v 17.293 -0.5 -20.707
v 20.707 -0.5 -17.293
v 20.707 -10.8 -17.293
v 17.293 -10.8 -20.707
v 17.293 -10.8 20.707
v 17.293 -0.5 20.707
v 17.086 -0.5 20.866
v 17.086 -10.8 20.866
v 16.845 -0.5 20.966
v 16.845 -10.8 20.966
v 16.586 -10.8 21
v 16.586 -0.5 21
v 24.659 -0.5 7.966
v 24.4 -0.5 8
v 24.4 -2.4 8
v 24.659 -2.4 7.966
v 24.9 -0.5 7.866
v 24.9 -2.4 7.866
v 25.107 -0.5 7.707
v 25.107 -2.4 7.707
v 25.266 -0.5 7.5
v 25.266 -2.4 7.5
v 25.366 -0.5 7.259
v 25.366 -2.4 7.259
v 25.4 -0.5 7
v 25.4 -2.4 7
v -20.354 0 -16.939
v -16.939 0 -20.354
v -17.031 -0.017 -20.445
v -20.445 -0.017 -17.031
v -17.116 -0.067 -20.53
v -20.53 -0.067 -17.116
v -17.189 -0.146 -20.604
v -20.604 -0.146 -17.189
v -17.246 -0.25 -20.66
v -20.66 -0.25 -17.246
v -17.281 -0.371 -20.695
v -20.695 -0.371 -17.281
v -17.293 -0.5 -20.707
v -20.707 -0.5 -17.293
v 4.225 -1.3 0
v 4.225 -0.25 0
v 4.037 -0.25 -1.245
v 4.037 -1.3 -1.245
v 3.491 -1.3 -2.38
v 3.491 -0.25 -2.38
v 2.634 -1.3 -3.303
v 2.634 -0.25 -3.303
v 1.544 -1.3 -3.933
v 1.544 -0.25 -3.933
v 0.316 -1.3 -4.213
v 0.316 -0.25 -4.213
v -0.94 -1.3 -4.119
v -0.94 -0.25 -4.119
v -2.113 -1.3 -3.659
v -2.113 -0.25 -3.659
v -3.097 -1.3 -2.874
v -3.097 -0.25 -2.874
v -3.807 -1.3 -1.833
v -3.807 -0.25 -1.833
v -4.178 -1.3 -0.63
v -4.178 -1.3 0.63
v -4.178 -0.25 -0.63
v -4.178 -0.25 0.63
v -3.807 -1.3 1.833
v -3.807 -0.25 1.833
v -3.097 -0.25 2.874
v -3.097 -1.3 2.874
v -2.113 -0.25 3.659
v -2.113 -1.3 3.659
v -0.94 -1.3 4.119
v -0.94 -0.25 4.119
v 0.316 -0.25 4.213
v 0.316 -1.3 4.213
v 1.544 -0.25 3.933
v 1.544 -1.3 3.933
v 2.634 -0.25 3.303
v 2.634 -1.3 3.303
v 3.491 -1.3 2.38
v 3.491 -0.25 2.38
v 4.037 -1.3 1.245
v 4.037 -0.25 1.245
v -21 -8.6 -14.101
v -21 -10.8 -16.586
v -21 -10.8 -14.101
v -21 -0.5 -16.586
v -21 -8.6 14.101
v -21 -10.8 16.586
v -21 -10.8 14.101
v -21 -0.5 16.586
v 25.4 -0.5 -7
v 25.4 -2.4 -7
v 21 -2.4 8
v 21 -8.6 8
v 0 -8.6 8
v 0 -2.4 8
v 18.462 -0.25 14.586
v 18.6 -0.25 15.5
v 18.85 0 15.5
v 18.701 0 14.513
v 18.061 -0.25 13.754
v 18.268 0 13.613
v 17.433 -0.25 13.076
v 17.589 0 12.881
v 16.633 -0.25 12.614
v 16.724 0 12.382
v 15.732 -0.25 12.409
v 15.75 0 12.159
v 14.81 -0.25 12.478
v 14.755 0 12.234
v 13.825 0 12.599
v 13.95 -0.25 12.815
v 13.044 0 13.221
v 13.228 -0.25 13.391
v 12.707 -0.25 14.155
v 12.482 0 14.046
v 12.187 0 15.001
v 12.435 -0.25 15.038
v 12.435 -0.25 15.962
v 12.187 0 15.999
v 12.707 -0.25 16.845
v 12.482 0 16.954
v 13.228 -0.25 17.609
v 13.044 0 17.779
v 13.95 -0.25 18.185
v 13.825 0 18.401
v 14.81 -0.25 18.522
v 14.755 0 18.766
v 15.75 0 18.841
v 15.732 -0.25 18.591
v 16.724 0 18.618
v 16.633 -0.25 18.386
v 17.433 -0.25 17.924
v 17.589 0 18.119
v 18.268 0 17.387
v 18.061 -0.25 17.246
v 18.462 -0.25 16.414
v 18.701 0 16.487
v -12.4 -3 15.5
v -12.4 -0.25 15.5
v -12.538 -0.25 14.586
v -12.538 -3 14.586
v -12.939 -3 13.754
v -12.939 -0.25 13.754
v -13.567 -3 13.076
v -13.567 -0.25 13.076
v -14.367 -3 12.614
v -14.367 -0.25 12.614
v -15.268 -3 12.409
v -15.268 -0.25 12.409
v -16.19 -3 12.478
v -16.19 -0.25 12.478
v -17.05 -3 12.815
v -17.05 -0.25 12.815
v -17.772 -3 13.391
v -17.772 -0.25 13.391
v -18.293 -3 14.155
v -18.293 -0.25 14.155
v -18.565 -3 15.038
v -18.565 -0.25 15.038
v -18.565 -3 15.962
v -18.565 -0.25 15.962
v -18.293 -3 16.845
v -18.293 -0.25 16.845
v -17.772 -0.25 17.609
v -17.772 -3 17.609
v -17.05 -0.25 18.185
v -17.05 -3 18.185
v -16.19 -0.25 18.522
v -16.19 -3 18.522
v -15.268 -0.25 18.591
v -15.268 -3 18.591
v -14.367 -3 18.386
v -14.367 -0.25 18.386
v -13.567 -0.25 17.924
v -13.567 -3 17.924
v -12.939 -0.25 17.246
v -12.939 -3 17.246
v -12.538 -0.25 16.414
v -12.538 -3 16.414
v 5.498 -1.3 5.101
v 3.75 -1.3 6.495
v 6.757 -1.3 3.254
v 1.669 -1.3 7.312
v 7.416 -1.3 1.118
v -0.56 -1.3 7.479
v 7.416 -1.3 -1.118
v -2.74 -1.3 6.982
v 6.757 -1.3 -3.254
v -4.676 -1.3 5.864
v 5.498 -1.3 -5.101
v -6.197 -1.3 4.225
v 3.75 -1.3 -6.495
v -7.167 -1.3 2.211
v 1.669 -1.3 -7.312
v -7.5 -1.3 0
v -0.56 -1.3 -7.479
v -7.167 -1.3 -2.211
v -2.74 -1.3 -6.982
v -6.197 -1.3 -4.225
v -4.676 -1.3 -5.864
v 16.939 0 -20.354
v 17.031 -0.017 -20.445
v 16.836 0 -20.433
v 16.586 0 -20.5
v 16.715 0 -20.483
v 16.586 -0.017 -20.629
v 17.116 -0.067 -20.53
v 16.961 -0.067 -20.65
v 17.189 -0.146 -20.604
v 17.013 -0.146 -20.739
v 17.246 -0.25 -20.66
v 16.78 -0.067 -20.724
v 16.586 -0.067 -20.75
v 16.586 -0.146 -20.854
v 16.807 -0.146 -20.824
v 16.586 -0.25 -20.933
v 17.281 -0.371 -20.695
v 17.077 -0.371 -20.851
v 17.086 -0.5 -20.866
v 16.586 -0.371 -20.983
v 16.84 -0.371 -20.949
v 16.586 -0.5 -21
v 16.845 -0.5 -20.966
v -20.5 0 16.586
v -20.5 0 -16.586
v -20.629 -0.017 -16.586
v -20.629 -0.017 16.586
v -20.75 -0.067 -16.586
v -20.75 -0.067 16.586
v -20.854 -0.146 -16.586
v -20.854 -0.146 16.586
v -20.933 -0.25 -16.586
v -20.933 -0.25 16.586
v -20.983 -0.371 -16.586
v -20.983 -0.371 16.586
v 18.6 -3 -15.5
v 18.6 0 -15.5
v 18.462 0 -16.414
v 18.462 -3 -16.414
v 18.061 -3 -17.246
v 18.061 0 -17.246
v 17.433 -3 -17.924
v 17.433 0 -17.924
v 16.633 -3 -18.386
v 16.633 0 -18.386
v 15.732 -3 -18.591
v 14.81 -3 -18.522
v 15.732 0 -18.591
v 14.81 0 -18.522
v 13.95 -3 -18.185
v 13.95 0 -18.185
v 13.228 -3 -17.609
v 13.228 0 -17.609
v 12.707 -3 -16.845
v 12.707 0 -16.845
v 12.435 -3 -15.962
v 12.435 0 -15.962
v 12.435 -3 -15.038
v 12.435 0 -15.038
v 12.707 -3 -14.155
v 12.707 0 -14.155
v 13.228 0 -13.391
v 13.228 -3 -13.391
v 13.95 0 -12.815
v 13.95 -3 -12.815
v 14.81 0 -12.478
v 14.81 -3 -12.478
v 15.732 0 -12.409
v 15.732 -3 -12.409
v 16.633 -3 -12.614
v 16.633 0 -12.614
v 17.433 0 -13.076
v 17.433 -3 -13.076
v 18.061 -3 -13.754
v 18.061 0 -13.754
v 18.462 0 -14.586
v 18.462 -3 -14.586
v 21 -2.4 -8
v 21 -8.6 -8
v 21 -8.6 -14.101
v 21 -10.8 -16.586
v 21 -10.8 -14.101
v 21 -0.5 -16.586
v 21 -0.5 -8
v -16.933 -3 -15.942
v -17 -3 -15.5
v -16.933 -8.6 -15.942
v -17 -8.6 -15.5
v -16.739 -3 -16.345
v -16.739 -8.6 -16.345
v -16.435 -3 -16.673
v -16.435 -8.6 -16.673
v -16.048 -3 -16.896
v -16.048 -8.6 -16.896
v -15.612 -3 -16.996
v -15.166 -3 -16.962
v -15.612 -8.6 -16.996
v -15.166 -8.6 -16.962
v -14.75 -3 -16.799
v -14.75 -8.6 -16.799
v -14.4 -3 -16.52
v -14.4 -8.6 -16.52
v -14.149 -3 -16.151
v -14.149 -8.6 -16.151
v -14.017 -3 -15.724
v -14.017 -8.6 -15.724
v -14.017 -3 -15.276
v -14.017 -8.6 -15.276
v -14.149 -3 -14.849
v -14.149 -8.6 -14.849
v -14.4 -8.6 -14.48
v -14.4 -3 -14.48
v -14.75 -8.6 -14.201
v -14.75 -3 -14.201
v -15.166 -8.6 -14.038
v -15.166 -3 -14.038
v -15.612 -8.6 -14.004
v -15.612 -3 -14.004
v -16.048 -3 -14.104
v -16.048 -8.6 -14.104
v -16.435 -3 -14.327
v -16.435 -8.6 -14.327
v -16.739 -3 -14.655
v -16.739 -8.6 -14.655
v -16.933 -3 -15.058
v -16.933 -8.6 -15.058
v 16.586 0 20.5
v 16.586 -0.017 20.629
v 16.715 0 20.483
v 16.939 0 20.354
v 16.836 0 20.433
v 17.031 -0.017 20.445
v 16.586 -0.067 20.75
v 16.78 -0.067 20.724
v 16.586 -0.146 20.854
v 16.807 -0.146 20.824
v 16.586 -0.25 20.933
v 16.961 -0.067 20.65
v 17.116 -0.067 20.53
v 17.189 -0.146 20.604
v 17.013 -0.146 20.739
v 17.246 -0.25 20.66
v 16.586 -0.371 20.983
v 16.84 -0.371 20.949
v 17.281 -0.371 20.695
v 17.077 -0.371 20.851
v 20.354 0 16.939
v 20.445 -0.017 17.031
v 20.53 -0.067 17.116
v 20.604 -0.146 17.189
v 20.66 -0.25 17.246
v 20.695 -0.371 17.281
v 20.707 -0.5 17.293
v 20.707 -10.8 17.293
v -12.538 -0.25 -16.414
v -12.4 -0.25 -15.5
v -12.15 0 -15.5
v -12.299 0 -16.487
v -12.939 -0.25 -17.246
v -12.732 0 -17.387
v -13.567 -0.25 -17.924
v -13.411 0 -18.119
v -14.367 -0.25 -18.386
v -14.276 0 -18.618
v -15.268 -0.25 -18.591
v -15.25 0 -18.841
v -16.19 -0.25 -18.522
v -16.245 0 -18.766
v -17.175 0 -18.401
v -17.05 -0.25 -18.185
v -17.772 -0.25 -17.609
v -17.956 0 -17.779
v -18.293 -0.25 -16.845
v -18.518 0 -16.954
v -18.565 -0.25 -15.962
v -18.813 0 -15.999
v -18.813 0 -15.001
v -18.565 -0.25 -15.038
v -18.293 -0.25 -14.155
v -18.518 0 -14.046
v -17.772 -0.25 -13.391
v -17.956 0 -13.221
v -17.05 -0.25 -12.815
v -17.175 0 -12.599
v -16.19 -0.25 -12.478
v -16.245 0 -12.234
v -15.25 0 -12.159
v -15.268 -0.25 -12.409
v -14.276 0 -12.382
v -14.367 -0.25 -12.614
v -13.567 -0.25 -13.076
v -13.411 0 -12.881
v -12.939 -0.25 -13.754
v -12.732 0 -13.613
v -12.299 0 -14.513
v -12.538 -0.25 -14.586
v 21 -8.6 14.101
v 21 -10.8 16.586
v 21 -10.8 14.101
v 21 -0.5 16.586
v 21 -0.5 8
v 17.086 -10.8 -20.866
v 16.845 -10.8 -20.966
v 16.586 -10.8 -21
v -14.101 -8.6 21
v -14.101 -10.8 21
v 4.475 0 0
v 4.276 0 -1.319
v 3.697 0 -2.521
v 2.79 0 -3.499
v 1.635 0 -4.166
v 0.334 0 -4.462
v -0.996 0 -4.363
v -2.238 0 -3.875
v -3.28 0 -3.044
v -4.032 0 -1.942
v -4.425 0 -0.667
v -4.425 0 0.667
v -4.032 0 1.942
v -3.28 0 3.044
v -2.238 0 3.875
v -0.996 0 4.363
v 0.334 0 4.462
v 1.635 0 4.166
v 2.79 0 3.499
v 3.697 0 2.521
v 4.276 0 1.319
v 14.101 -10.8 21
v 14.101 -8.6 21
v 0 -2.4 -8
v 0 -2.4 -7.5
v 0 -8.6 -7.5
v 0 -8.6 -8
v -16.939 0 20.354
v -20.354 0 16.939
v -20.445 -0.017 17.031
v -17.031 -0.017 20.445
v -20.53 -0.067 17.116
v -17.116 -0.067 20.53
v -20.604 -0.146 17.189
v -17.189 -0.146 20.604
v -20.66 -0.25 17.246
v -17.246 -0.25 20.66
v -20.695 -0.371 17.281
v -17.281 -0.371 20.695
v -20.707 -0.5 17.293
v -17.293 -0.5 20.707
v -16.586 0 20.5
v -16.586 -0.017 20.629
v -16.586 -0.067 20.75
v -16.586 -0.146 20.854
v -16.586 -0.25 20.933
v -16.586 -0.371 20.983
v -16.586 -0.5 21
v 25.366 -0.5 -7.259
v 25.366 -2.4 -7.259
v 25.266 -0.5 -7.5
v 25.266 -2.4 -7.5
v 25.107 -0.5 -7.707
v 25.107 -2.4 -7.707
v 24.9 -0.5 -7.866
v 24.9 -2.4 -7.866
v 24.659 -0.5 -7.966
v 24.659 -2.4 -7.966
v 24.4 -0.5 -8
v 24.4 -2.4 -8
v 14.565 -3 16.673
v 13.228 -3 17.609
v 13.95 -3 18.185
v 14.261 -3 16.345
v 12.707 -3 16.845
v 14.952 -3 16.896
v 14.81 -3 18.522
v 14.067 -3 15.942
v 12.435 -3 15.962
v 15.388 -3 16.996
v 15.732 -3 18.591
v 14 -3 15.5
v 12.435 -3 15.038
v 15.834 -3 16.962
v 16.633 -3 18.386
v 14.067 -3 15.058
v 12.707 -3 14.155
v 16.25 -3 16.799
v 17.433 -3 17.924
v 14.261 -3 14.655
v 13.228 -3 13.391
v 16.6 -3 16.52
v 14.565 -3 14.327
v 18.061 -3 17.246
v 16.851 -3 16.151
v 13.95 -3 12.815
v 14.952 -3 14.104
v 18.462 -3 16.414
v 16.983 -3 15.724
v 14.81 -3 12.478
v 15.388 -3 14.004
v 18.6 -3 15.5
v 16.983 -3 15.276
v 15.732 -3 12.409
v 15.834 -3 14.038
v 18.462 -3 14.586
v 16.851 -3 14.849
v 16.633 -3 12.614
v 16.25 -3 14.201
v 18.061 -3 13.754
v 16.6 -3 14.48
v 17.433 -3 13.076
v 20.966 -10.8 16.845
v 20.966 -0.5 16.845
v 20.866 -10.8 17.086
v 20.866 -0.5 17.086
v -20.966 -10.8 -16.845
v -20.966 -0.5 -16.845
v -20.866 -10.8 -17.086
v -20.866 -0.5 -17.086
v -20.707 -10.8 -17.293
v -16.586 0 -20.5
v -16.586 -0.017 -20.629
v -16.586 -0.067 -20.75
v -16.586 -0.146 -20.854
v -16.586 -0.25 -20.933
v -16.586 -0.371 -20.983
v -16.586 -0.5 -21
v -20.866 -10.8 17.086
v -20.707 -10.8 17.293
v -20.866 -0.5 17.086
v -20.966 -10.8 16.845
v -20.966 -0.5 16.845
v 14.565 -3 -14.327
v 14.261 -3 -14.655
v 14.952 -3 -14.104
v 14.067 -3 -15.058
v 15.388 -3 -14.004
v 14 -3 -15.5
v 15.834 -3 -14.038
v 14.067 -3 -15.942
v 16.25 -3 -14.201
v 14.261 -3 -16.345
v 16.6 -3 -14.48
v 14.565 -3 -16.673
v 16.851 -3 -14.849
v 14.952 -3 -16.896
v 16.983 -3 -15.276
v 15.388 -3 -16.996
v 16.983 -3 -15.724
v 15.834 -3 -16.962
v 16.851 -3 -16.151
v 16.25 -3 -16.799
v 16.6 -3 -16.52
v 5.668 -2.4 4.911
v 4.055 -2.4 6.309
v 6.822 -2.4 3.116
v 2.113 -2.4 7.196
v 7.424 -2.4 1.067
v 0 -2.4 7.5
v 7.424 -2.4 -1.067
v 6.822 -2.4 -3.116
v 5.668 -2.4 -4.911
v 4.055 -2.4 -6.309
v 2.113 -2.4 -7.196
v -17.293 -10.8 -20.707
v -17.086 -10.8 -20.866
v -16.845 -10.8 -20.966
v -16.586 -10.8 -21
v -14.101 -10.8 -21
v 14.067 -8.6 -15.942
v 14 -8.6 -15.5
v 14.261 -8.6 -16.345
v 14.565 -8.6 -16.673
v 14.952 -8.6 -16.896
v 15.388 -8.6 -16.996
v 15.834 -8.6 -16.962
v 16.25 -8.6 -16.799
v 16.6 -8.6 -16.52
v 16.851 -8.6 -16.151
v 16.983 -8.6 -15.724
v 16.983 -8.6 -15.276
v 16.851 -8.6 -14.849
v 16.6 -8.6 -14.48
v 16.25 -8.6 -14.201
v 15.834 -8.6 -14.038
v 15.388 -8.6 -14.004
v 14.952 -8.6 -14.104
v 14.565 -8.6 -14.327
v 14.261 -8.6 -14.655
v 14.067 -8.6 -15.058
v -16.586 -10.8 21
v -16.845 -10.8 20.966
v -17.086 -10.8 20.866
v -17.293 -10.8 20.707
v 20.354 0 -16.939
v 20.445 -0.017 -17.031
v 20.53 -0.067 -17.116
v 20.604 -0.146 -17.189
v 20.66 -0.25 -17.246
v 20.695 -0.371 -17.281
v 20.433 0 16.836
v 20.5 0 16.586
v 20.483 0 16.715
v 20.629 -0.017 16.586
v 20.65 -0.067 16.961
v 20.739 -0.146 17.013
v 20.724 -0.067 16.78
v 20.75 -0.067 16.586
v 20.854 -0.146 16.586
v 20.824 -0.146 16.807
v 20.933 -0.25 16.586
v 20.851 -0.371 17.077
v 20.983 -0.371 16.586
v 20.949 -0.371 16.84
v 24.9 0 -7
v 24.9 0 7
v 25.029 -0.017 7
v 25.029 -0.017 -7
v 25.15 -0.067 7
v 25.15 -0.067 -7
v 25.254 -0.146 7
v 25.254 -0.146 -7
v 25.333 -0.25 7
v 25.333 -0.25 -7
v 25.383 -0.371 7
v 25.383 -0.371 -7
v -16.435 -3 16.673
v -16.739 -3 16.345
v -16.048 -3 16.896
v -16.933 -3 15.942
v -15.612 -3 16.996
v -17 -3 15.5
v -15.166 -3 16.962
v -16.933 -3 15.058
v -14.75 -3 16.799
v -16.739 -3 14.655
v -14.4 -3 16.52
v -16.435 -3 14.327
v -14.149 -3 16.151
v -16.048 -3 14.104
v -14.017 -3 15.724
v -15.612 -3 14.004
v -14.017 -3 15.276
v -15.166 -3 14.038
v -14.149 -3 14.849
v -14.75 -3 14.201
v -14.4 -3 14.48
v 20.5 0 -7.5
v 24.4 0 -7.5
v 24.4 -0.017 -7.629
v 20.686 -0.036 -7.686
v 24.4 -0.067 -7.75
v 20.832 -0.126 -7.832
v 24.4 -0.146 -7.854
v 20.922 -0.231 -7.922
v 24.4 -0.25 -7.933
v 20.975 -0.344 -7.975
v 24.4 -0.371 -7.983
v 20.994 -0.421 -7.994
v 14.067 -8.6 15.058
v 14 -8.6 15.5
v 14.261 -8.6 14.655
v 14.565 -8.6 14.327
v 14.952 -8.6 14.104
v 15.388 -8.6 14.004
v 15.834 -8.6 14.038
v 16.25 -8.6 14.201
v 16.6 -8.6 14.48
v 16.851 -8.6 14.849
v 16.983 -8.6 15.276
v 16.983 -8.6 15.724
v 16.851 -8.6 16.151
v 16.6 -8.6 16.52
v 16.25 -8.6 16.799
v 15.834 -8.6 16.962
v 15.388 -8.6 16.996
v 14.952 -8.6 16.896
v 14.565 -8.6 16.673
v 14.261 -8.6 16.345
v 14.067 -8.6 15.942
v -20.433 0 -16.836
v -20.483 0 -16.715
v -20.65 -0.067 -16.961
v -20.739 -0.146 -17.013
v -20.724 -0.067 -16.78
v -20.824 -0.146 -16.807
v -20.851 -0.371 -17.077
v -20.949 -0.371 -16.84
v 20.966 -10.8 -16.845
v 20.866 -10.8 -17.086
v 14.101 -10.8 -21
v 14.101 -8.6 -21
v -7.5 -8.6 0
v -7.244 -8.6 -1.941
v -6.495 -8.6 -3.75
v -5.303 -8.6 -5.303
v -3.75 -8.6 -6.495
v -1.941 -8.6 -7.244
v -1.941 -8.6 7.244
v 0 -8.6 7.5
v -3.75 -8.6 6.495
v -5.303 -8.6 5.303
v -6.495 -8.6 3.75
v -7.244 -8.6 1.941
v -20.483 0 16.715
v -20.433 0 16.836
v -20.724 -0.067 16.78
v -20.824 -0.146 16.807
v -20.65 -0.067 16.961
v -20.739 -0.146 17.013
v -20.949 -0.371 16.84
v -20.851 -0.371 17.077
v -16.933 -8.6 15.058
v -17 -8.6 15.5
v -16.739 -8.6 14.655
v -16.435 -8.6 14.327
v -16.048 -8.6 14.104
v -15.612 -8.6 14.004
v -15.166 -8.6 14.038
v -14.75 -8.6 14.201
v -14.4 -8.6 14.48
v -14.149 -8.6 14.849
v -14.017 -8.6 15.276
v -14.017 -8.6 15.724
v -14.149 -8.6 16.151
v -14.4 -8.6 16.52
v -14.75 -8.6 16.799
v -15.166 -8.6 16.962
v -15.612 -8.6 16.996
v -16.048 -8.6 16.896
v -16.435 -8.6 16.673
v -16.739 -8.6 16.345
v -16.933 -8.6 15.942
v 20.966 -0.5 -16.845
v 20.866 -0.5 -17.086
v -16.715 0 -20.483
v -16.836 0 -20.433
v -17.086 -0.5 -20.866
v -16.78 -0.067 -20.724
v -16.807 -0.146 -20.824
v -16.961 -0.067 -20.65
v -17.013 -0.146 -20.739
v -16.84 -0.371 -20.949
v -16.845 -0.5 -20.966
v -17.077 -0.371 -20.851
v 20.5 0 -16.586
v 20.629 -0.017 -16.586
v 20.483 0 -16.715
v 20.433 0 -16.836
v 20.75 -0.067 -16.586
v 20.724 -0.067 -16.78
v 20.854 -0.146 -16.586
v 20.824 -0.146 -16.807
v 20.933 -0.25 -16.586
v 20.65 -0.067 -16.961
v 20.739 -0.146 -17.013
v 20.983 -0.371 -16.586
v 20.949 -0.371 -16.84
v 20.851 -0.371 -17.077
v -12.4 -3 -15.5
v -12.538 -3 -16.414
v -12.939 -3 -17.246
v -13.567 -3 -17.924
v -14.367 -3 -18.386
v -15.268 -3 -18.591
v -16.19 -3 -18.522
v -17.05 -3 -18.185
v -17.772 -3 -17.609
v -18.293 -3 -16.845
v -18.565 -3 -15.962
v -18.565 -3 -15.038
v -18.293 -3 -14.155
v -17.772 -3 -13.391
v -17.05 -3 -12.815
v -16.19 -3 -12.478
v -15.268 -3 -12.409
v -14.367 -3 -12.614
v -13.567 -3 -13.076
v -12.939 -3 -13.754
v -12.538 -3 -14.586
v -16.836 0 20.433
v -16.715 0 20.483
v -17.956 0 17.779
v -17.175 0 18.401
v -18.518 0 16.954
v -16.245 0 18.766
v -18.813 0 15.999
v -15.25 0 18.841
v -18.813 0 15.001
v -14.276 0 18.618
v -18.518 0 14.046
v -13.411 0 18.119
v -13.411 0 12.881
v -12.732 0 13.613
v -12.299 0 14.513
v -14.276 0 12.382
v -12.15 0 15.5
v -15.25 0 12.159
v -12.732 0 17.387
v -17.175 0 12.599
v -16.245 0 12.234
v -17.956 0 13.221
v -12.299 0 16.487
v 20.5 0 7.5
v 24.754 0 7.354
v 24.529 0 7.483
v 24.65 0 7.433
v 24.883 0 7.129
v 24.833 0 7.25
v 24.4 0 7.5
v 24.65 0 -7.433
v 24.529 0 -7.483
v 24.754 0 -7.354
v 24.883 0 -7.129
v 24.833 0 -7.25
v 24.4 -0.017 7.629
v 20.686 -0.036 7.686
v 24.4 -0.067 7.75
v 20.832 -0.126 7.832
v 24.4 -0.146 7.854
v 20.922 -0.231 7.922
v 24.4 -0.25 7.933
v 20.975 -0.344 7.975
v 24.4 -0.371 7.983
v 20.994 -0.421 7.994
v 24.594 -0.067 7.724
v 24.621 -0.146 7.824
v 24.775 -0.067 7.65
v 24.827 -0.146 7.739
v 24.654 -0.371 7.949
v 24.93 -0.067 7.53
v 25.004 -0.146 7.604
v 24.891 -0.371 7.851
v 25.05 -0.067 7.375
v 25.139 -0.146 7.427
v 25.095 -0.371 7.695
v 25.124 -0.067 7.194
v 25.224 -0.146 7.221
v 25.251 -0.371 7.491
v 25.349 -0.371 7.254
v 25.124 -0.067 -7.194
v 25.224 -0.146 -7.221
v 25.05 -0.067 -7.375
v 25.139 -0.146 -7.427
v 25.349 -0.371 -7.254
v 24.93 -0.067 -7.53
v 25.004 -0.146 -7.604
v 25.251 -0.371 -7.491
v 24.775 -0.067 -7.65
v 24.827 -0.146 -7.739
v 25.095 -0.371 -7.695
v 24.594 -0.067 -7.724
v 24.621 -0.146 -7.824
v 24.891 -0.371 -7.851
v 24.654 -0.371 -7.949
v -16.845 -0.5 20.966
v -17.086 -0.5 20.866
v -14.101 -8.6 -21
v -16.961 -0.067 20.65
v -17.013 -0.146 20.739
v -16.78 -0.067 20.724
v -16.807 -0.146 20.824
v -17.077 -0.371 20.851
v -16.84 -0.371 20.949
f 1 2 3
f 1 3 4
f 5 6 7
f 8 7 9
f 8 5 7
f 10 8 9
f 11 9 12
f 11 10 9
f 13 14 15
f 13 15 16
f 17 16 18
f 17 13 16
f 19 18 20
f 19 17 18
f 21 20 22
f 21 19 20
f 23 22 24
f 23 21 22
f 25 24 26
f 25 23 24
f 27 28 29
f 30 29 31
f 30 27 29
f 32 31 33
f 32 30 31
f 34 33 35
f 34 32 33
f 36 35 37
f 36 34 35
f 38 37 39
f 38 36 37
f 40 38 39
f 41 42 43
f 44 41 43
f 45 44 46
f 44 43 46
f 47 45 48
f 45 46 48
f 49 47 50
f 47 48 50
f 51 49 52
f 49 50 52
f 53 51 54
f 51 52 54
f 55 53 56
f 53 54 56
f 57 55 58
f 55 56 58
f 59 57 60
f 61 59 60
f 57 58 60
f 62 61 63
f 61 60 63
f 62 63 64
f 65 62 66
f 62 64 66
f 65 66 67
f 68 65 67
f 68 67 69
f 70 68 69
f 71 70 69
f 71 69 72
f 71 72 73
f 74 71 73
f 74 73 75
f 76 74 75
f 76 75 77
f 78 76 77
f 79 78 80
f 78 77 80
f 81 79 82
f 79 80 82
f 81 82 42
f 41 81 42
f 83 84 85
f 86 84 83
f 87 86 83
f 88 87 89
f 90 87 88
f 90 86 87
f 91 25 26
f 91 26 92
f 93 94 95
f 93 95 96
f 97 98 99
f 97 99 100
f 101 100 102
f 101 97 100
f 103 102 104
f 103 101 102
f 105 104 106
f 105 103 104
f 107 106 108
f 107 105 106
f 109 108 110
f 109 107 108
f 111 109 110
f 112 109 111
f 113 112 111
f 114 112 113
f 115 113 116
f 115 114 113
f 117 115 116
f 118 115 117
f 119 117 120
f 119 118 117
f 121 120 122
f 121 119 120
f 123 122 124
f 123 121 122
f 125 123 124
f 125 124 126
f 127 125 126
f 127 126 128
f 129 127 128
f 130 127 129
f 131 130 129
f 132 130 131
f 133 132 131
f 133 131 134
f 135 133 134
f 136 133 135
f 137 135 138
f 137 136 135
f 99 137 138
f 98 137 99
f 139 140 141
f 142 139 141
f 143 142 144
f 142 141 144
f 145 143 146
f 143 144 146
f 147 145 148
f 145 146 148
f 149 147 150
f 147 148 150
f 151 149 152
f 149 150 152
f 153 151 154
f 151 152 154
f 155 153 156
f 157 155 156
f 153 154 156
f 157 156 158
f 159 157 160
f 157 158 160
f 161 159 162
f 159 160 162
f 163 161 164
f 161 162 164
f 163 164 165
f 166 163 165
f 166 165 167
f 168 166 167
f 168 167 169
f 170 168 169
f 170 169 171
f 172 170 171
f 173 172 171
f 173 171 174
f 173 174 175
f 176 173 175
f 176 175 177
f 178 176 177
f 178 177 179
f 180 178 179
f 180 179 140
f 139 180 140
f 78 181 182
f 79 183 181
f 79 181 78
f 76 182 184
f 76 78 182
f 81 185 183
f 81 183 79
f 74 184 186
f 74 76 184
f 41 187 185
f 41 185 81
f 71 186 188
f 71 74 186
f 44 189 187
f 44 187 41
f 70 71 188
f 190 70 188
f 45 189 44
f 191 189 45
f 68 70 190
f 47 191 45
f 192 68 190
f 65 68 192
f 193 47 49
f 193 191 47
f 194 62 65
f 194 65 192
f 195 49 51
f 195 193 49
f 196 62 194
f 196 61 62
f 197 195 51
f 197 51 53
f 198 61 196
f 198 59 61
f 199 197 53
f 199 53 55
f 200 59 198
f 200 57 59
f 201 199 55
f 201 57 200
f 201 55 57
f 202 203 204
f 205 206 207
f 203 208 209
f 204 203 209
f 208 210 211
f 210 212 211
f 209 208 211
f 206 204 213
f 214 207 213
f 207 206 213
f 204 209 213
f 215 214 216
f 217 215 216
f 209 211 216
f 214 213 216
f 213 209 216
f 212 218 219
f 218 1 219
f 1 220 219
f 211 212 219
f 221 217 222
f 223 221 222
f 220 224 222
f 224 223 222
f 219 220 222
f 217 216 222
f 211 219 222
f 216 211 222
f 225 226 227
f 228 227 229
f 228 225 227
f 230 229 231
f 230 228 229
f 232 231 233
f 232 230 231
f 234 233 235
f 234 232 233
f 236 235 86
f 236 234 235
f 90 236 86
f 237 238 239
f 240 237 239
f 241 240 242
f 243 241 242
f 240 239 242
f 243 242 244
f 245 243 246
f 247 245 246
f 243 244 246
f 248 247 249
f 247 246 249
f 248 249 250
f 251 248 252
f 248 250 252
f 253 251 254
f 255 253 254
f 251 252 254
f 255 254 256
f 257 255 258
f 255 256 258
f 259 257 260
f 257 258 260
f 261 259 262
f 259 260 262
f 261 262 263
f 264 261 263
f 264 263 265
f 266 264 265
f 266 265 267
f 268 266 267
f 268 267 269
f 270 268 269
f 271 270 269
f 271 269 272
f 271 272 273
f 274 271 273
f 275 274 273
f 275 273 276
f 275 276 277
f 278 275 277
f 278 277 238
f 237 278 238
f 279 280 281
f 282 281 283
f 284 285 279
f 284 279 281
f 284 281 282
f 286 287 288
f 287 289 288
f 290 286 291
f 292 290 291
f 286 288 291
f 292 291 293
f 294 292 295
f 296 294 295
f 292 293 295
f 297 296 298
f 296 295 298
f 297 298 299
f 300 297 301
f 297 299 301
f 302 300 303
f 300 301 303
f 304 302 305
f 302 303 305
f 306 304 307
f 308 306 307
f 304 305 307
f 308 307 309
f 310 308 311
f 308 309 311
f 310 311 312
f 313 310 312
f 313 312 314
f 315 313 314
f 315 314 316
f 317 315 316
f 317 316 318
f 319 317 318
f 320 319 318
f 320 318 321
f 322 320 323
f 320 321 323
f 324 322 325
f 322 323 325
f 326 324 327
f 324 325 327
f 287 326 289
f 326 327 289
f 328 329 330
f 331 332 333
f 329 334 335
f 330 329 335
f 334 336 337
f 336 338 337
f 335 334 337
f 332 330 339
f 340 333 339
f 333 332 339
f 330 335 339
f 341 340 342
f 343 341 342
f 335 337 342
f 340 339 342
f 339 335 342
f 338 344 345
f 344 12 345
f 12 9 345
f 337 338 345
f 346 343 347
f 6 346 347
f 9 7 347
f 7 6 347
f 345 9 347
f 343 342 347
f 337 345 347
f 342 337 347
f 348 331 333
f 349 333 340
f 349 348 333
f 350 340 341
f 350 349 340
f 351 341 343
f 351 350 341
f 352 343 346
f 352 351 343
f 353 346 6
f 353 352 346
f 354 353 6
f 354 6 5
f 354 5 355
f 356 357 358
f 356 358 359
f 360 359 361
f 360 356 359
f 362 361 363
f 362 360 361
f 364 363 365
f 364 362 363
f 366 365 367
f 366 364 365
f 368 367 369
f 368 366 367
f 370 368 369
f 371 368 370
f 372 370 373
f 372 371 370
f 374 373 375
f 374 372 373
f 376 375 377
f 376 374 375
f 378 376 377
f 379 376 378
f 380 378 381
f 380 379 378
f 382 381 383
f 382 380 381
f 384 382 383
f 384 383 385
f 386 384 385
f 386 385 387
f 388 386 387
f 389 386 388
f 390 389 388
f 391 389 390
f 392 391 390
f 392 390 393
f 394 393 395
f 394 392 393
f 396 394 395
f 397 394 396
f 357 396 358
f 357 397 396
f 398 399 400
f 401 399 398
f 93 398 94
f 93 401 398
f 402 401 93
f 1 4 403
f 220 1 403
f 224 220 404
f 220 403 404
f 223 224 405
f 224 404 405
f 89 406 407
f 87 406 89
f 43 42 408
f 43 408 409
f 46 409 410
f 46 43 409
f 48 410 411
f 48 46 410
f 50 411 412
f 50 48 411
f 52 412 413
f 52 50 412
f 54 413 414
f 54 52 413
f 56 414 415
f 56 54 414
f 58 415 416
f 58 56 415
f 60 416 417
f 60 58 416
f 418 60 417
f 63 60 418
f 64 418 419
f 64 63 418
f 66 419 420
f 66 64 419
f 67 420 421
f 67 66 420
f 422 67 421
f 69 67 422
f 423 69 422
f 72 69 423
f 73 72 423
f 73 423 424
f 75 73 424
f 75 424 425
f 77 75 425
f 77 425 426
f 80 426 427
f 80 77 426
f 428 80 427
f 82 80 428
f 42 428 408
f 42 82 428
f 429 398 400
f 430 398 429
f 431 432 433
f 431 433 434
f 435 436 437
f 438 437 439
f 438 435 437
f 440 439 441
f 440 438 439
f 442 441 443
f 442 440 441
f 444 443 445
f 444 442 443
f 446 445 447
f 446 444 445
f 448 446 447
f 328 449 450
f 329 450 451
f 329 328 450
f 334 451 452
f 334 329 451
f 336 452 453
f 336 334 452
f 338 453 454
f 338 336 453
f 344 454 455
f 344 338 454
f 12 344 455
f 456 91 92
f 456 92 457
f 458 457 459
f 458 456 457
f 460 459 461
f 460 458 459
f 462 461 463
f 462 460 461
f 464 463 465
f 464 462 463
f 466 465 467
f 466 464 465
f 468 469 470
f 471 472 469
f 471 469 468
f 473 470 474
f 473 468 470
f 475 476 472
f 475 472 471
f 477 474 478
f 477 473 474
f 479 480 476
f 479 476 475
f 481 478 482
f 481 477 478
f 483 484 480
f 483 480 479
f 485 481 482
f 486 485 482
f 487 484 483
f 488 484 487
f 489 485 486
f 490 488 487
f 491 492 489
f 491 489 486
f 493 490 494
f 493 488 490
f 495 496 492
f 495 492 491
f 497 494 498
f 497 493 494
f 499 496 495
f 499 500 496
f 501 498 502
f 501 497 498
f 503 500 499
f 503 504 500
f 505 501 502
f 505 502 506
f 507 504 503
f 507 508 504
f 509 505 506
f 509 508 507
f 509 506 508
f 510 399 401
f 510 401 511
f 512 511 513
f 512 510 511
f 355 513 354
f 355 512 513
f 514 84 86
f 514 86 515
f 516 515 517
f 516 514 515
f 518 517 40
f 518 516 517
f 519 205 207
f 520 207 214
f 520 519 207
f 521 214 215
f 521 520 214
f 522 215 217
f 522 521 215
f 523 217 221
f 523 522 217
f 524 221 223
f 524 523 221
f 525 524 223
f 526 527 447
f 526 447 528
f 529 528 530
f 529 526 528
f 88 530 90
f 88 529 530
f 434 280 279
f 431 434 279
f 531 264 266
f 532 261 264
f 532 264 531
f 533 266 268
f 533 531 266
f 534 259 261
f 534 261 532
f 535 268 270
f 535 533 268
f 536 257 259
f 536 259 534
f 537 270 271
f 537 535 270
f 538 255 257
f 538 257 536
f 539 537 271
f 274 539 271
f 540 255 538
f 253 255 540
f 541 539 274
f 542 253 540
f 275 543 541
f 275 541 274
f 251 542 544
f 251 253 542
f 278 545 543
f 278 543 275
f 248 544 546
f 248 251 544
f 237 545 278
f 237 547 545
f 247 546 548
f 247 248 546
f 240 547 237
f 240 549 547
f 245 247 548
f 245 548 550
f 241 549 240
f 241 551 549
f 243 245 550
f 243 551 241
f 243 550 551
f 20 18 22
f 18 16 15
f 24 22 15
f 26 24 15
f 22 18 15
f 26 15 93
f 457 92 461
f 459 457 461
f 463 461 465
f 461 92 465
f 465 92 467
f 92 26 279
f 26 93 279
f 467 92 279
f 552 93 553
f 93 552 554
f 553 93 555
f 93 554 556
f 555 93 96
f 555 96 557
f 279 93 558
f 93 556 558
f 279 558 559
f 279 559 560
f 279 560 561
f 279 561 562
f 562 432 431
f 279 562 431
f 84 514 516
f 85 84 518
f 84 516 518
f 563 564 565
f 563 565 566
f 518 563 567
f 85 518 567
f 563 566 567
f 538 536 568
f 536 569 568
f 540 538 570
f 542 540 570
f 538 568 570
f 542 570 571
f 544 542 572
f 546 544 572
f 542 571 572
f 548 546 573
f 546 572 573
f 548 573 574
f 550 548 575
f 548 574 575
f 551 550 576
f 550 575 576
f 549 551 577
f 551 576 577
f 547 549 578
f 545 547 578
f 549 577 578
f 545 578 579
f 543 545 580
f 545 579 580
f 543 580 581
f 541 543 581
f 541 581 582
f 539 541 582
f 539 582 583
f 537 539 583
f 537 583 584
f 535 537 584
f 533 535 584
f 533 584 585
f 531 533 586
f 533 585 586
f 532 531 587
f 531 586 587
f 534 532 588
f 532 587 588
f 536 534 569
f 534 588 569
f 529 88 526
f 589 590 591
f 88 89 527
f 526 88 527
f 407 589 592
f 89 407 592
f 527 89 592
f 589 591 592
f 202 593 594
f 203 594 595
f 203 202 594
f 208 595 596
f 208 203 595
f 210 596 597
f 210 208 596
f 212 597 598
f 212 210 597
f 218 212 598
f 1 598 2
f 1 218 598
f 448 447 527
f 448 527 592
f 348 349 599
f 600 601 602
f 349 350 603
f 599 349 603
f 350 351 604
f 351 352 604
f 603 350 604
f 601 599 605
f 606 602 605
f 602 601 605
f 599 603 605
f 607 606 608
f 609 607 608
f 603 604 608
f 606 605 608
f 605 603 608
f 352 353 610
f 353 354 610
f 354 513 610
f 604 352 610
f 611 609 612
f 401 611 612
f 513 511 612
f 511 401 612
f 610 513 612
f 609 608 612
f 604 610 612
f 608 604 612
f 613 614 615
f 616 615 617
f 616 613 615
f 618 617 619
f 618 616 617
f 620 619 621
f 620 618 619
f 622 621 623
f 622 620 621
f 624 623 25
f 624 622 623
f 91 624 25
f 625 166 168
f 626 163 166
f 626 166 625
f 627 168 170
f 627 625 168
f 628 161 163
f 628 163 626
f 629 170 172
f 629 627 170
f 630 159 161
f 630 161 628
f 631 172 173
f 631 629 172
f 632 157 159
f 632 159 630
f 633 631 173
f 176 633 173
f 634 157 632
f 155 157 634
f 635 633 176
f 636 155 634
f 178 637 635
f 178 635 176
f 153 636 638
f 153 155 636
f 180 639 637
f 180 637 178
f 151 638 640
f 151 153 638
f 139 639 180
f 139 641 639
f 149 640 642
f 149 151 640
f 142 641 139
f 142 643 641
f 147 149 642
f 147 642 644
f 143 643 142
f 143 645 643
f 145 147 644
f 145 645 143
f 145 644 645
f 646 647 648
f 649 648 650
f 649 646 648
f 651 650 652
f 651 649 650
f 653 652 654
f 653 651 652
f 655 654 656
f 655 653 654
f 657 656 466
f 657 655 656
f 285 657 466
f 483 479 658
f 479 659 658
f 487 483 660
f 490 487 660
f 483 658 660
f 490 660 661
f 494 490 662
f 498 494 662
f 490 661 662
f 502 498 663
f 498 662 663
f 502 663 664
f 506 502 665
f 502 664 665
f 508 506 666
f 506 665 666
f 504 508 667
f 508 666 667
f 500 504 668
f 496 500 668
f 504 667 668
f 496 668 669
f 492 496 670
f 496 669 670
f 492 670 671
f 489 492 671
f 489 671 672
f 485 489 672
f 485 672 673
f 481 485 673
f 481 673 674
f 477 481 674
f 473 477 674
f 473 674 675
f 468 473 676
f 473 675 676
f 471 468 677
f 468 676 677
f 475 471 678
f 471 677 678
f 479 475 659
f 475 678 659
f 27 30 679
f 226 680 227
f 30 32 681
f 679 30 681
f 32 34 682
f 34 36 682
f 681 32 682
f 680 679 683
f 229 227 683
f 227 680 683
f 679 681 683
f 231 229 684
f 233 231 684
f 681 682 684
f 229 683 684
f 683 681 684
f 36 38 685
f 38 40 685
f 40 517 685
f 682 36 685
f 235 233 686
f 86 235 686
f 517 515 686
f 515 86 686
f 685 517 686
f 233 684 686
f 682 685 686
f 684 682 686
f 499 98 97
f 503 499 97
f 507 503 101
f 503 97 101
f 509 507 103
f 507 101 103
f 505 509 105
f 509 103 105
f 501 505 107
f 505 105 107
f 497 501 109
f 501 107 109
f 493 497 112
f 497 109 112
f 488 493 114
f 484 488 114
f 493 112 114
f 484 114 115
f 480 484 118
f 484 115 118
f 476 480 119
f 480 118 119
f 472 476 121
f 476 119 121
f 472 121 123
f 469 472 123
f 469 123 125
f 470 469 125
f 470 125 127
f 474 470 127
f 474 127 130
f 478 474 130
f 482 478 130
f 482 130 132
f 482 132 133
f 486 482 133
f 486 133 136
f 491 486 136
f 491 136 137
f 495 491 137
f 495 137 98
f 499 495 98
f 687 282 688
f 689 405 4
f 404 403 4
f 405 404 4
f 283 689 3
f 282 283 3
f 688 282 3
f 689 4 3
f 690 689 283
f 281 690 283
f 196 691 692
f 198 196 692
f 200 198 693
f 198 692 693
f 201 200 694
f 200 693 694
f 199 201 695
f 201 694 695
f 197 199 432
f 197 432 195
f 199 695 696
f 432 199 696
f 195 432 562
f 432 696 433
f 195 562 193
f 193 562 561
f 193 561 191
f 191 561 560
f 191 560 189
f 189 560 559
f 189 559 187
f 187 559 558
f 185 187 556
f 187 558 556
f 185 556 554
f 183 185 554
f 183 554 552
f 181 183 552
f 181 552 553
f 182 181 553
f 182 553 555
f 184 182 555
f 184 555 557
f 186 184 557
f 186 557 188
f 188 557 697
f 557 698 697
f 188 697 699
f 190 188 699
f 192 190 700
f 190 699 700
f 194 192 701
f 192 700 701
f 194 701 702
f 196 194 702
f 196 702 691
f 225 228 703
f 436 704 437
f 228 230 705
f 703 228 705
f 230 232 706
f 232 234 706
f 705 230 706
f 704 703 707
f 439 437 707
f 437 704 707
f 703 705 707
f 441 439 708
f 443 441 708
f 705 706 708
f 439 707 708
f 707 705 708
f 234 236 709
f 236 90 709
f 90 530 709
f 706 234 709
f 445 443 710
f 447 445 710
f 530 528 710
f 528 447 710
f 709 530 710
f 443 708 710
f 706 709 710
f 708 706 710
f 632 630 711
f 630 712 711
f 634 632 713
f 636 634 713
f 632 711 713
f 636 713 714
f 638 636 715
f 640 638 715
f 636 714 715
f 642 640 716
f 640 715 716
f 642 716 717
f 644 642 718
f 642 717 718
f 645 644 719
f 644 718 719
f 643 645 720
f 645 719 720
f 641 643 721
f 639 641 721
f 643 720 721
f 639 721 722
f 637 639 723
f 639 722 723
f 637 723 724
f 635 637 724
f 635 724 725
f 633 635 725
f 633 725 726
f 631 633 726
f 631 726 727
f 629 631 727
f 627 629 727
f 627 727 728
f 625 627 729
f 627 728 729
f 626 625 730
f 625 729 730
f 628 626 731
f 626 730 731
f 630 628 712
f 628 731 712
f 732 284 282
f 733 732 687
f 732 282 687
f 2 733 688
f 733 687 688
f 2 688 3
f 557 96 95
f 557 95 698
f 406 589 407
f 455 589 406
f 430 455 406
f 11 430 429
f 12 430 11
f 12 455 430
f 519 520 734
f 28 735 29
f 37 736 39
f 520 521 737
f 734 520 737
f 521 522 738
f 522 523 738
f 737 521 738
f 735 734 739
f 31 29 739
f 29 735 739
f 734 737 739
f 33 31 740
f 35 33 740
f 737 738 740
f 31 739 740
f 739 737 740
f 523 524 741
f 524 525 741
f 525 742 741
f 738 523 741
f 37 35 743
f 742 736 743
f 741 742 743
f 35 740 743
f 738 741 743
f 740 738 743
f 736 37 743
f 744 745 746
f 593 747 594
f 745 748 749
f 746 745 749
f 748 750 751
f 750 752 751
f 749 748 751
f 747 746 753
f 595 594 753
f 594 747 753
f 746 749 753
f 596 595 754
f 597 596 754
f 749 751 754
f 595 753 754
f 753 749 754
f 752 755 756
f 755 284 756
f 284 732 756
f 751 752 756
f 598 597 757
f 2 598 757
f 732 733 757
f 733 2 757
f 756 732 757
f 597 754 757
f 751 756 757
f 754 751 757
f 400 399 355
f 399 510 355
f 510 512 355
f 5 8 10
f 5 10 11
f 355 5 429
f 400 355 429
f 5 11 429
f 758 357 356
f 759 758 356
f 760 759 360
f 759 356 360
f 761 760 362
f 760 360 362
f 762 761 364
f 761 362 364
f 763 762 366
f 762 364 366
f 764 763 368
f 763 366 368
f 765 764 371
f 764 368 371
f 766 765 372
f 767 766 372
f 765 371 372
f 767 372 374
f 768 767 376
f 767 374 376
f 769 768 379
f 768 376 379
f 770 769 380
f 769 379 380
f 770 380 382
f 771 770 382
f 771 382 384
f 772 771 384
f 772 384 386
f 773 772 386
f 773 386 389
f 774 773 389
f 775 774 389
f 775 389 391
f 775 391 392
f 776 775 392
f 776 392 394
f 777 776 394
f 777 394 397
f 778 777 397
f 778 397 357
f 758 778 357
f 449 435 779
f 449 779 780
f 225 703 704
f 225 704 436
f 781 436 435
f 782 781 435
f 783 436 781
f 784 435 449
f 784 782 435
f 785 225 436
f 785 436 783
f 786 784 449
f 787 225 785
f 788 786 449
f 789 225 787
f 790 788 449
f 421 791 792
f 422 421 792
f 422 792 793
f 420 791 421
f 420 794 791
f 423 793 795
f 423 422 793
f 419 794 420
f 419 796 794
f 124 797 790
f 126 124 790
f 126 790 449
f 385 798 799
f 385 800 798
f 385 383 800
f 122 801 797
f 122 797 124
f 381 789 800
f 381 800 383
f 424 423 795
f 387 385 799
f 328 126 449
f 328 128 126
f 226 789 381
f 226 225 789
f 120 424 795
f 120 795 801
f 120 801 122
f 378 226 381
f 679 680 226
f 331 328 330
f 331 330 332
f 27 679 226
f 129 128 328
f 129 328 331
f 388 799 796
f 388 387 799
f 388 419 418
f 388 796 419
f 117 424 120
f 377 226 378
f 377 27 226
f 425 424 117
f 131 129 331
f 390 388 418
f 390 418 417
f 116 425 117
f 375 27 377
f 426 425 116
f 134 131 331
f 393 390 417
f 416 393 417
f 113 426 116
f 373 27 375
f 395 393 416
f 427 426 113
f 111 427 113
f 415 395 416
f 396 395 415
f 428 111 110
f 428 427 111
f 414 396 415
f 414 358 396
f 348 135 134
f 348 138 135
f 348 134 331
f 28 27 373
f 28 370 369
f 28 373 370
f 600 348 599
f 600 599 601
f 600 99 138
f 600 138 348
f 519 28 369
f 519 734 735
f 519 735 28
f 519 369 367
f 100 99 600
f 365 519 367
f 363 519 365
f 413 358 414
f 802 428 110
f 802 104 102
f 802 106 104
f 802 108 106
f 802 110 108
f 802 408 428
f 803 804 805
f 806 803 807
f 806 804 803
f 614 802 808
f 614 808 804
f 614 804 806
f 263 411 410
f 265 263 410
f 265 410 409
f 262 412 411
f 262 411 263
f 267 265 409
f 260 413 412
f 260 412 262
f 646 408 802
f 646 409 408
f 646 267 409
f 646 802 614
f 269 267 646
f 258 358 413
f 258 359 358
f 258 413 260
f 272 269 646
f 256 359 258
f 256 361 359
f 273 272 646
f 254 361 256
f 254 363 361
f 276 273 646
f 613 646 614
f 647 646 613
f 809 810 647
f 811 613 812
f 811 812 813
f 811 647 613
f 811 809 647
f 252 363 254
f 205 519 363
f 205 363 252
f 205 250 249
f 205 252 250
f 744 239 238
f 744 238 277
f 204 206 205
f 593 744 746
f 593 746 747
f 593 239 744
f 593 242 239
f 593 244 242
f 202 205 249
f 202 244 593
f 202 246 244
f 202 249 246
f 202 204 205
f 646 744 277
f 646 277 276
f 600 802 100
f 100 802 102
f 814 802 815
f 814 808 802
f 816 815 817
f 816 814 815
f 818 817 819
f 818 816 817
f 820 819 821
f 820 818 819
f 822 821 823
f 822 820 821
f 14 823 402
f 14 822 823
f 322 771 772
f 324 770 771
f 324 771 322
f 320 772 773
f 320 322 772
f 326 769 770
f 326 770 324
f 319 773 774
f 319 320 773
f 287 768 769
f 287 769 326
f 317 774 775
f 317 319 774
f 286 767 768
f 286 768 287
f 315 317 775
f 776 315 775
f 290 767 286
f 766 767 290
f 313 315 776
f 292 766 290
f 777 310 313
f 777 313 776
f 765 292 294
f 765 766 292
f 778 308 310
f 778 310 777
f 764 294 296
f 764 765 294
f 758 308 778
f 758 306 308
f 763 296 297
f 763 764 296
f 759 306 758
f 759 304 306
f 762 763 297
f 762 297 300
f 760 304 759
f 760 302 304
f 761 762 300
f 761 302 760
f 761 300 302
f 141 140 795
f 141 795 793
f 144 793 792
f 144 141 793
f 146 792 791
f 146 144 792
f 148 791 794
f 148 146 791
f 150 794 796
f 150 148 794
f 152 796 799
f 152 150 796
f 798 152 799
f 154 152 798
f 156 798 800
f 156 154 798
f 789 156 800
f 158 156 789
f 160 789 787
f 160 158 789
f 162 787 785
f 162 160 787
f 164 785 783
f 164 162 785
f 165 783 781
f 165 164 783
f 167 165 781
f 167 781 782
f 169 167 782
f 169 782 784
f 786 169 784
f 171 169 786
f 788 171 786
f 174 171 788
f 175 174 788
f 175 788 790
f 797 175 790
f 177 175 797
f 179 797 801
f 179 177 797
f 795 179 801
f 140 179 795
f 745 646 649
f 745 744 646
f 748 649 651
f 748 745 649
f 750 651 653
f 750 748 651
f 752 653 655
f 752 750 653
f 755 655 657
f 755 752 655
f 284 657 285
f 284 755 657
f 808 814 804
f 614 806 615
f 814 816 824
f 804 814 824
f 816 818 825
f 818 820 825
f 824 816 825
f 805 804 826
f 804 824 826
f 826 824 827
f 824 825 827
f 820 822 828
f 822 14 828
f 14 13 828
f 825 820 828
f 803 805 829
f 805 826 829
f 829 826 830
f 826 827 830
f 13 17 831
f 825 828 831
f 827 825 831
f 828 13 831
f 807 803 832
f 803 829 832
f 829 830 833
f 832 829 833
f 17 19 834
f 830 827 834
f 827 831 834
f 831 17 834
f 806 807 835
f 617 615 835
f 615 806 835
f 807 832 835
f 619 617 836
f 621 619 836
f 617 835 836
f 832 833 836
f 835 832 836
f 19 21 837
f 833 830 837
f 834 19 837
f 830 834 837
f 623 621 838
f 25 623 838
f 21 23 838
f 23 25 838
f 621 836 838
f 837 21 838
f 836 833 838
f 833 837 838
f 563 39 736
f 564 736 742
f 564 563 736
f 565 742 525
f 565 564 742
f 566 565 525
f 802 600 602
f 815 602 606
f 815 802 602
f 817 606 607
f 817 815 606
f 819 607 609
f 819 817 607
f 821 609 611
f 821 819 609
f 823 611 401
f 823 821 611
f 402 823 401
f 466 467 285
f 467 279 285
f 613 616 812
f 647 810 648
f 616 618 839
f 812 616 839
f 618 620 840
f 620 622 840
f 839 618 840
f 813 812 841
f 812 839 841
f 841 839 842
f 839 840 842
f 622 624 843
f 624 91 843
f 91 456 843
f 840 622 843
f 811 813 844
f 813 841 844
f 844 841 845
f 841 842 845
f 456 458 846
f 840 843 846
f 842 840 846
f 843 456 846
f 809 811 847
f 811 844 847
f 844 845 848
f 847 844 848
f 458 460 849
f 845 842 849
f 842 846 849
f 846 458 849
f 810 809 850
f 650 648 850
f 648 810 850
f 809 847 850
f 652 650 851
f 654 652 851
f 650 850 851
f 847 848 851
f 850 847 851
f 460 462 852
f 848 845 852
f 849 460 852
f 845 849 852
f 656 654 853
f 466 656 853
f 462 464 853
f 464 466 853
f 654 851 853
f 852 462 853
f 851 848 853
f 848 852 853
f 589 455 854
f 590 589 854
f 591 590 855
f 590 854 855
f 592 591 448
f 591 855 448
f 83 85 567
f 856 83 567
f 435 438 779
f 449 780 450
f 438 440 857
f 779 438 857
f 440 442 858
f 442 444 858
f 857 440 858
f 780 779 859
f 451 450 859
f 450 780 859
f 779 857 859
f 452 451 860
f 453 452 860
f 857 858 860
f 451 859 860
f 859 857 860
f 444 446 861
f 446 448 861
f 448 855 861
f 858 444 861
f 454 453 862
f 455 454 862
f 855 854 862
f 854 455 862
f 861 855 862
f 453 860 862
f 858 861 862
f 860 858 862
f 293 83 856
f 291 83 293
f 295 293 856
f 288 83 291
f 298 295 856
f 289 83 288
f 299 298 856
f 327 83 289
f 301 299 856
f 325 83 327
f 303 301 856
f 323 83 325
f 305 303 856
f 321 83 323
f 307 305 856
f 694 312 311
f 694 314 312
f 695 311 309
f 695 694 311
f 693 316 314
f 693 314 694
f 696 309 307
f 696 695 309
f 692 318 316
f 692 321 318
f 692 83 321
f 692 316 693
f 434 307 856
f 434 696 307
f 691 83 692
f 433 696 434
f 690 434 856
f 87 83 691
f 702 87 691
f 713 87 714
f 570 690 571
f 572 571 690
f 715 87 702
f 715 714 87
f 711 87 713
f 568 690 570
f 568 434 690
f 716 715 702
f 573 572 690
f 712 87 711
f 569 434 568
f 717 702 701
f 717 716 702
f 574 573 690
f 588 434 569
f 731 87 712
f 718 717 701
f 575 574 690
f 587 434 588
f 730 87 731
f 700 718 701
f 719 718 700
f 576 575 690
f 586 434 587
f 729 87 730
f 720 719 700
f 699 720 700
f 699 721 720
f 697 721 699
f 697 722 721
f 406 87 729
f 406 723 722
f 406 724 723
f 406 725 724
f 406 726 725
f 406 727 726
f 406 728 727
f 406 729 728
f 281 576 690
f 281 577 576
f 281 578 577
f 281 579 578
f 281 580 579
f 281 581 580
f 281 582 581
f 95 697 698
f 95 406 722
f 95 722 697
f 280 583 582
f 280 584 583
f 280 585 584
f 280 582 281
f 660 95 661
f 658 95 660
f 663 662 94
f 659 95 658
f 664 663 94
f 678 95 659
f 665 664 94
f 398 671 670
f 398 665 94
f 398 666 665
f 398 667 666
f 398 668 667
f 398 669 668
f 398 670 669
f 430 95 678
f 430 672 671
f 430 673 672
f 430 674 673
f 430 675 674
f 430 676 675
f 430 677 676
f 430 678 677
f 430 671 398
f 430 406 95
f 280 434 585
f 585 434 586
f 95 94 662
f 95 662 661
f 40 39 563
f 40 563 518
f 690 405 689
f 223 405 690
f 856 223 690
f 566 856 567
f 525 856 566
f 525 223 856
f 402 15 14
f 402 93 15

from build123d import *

# Parameters (mm, degrees)
SALIENTE_EXTRUIR1_DEPTH                              = 10.8
CORTAR_EXTRUIR1_DEPTH                                = 2.2
SALIENTE_EXTRUIR2_DEPTH                              = 2.2
SALIENTE_EXTRUIR3_DEPTH                              = 2.2
CROQUIS5_W                                           = 16
CROQUIS5_H                                           = 2.4
SALIENTE_EXTRUIR4_DEPTH                              = 4.4
CROQUIS6_W                                           = 16
CROQUIS6_H                                           = 6.2
CORTAR_EXTRUIR2_DEPTH                                = 21
REFRENTADO_PARA_PERNO_CON_CABEZA_HEXAGON_D           = 8.45
REFRENTADO_PARA_PERNO_CON_CABEZA_HEXAGON_CBORE_D     = 15
REFRENTADO_PARA_PERNO_CON_CABEZA_HEXAGON_CBORE_DEPTH = 7.3
REFRENTADO_PARA_TORNILLO_CON_CABEZA_HEXA_D           = 3
REFRENTADO_PARA_TORNILLO_CON_CABEZA_HEXA_DEPTH       = 10.8
REFRENTADO_PARA_TORNILLO_CON_CABEZA_HEXA_CBORE_D     = 6.2
REFRENTADO_PARA_TORNILLO_CON_CABEZA_HEXA_CBORE_DEPTH = 3
REDONDEO1_R                                          = 1
CHAFL_N1_SIZE                                        = 0.25
REDONDEO2_R                                          = 0.5


with BuildPart() as part:
    # Croquis1 → Saliente-Extruir1 (new body)
    with BuildSketch(Plane(origin=(0, 0, 0), x_dir=(1, 0, 0), z_dir=(0, 1, 0))):
        Polygon((21, -17), (21, 17), (17, 21), (-17, 21), (-21, 17), (-21, -17), (-17, -21), (17, -21), align=None)
    extrude(amount=-SALIENTE_EXTRUIR1_DEPTH)

    # Croquis2 → Cortar-Extruir1 (cut)
    with BuildSketch(Plane.XZ.offset(10.8)):
        Polygon((-21, 17), (-21, -14.100780618), (-14.100780618, -21), (14.100780618, -21), (21, -14.100780618), (21, 17), (17, 21), (-17, 21), align=None)
    extrude(amount=-CORTAR_EXTRUIR1_DEPTH, mode=Mode.SUBTRACT)

    # Croquis3 → Saliente-Extruir2 (add)
    with BuildSketch(Plane.XZ.offset(8.6)):
        Polygon((-21, 17), (-17, 21), (-14.100780618, 21), (-21, 14.100780618), align=None)
    extrude(amount=SALIENTE_EXTRUIR2_DEPTH)

    # Croquis4 → Saliente-Extruir3 (add)
    with BuildSketch(Plane.XZ.offset(8.6)):
        Polygon((21, 17), (21, 14.100780618), (14.100780618, 21), (17, 21), align=None)
    extrude(amount=SALIENTE_EXTRUIR3_DEPTH)

    # Croquis5 → Saliente-Extruir4 (add)
    with BuildSketch(Plane(origin=(21, 0, 0), x_dir=(0, 0, -1), z_dir=(1, 0, 0))):
        with Locations((0, -1.2)):
            Rectangle(CROQUIS5_W, CROQUIS5_H)
    extrude(amount=SALIENTE_EXTRUIR4_DEPTH)

    # Croquis6 → Cortar-Extruir2 (cut)
    with BuildSketch(Plane(origin=(21, 0, 0), x_dir=(0, 0, -1), z_dir=(1, 0, 0))):
        with Locations((0, -5.5)):
            Rectangle(CROQUIS6_W, CROQUIS6_H)
    extrude(amount=-CORTAR_EXTRUIR2_DEPTH, mode=Mode.SUBTRACT)

    # Refrentado para perno con cabeza hexagonal de M81 (through all)
    with Locations(Plane(origin=(0, -8.6, 0), x_dir=(-1, 0, 0), z_dir=(0, -1, 0))):
        with Locations((0, 0)):
            CounterBoreHole(REFRENTADO_PARA_PERNO_CON_CABEZA_HEXAGON_D / 2, REFRENTADO_PARA_PERNO_CON_CABEZA_HEXAGON_CBORE_D / 2, REFRENTADO_PARA_PERNO_CON_CABEZA_HEXAGON_CBORE_DEPTH)

    # Refrentado para tornillo con cabeza hexagonal de M2.51
    with Locations(Plane(origin=(0, 0, 0), x_dir=(1, 0, 0), z_dir=(0, 1, 0))):
        with Locations((15.5, -15.5), (-15.5, -15.5), (-15.5, 15.5), (15.5, 15.5)):
            CounterBoreHole(REFRENTADO_PARA_TORNILLO_CON_CABEZA_HEXA_D / 2, REFRENTADO_PARA_TORNILLO_CON_CABEZA_HEXA_CBORE_D / 2, REFRENTADO_PARA_TORNILLO_CON_CABEZA_HEXA_CBORE_DEPTH, depth=REFRENTADO_PARA_TORNILLO_CON_CABEZA_HEXA_DEPTH)

    # Redondeo1
    redondeo1_edges = [part.edges().sort_by_distance(p)[0] for p in [
        (-21, -5.4, -17),
        (-17, -5.4, -21),
        (17, -5.4, -21),
        (21, -5.4, -17),
        (21, -5.4, 17),
        (-21, -5.4, 17),
        (-17, -5.4, 21),
        (17, -5.4, 21),
        (25.4, -1.2, -8),
        (25.4, -1.2, 8),
    ]]
    fillet(redondeo1_edges, radius=REDONDEO1_R)

    # Chaflán1
    chafl_n1_edges = [part.edges().sort_by_distance(p)[0] for p in [
        (-4.225, 0, 0),
        (-18.6, 0, -15.5),
        (-18.6, 0, 15.5),
        (12.4, 0, 15.5),
    ]]
    chamfer(chafl_n1_edges, length=CHAFL_N1_SIZE)

    # Redondeo2
    redondeo2_edges = [part.edges().sort_by_distance(p)[0] for p in [
        (25.4, 0, 0),
        (19, 0, 19),
        (21, 0, 12.292893219),
        (22.7, 0, 8),
        (22.7, 0, -8),
        (19, 0, -19),
        (0, 0, -21),
        (-19, 0, -19),
        (-21, 0, 0),
        (-19, 0, 19),
        (0, 0, 21),
        (20.923879533, 0, 16.96846987),
        (20.923879533, 0, -16.96846987),
        (-20.923879533, 0, -16.96846987),
        (16.96846987, 0, 20.923879533),
        (16.96846987, 0, -20.923879533),
        (-16.96846987, 0, 20.923879533),
        (-16.96846987, 0, -20.923879533),
        (25.107106781, 0, 7.707106781),
        (-20.923879533, 0, 16.96846987),
        (25.107106781, 0, -7.707106781),
        (21, 0, -12.292893219),
    ]]
    fillet(redondeo2_edges, radius=REDONDEO2_R)


solid = part.part
